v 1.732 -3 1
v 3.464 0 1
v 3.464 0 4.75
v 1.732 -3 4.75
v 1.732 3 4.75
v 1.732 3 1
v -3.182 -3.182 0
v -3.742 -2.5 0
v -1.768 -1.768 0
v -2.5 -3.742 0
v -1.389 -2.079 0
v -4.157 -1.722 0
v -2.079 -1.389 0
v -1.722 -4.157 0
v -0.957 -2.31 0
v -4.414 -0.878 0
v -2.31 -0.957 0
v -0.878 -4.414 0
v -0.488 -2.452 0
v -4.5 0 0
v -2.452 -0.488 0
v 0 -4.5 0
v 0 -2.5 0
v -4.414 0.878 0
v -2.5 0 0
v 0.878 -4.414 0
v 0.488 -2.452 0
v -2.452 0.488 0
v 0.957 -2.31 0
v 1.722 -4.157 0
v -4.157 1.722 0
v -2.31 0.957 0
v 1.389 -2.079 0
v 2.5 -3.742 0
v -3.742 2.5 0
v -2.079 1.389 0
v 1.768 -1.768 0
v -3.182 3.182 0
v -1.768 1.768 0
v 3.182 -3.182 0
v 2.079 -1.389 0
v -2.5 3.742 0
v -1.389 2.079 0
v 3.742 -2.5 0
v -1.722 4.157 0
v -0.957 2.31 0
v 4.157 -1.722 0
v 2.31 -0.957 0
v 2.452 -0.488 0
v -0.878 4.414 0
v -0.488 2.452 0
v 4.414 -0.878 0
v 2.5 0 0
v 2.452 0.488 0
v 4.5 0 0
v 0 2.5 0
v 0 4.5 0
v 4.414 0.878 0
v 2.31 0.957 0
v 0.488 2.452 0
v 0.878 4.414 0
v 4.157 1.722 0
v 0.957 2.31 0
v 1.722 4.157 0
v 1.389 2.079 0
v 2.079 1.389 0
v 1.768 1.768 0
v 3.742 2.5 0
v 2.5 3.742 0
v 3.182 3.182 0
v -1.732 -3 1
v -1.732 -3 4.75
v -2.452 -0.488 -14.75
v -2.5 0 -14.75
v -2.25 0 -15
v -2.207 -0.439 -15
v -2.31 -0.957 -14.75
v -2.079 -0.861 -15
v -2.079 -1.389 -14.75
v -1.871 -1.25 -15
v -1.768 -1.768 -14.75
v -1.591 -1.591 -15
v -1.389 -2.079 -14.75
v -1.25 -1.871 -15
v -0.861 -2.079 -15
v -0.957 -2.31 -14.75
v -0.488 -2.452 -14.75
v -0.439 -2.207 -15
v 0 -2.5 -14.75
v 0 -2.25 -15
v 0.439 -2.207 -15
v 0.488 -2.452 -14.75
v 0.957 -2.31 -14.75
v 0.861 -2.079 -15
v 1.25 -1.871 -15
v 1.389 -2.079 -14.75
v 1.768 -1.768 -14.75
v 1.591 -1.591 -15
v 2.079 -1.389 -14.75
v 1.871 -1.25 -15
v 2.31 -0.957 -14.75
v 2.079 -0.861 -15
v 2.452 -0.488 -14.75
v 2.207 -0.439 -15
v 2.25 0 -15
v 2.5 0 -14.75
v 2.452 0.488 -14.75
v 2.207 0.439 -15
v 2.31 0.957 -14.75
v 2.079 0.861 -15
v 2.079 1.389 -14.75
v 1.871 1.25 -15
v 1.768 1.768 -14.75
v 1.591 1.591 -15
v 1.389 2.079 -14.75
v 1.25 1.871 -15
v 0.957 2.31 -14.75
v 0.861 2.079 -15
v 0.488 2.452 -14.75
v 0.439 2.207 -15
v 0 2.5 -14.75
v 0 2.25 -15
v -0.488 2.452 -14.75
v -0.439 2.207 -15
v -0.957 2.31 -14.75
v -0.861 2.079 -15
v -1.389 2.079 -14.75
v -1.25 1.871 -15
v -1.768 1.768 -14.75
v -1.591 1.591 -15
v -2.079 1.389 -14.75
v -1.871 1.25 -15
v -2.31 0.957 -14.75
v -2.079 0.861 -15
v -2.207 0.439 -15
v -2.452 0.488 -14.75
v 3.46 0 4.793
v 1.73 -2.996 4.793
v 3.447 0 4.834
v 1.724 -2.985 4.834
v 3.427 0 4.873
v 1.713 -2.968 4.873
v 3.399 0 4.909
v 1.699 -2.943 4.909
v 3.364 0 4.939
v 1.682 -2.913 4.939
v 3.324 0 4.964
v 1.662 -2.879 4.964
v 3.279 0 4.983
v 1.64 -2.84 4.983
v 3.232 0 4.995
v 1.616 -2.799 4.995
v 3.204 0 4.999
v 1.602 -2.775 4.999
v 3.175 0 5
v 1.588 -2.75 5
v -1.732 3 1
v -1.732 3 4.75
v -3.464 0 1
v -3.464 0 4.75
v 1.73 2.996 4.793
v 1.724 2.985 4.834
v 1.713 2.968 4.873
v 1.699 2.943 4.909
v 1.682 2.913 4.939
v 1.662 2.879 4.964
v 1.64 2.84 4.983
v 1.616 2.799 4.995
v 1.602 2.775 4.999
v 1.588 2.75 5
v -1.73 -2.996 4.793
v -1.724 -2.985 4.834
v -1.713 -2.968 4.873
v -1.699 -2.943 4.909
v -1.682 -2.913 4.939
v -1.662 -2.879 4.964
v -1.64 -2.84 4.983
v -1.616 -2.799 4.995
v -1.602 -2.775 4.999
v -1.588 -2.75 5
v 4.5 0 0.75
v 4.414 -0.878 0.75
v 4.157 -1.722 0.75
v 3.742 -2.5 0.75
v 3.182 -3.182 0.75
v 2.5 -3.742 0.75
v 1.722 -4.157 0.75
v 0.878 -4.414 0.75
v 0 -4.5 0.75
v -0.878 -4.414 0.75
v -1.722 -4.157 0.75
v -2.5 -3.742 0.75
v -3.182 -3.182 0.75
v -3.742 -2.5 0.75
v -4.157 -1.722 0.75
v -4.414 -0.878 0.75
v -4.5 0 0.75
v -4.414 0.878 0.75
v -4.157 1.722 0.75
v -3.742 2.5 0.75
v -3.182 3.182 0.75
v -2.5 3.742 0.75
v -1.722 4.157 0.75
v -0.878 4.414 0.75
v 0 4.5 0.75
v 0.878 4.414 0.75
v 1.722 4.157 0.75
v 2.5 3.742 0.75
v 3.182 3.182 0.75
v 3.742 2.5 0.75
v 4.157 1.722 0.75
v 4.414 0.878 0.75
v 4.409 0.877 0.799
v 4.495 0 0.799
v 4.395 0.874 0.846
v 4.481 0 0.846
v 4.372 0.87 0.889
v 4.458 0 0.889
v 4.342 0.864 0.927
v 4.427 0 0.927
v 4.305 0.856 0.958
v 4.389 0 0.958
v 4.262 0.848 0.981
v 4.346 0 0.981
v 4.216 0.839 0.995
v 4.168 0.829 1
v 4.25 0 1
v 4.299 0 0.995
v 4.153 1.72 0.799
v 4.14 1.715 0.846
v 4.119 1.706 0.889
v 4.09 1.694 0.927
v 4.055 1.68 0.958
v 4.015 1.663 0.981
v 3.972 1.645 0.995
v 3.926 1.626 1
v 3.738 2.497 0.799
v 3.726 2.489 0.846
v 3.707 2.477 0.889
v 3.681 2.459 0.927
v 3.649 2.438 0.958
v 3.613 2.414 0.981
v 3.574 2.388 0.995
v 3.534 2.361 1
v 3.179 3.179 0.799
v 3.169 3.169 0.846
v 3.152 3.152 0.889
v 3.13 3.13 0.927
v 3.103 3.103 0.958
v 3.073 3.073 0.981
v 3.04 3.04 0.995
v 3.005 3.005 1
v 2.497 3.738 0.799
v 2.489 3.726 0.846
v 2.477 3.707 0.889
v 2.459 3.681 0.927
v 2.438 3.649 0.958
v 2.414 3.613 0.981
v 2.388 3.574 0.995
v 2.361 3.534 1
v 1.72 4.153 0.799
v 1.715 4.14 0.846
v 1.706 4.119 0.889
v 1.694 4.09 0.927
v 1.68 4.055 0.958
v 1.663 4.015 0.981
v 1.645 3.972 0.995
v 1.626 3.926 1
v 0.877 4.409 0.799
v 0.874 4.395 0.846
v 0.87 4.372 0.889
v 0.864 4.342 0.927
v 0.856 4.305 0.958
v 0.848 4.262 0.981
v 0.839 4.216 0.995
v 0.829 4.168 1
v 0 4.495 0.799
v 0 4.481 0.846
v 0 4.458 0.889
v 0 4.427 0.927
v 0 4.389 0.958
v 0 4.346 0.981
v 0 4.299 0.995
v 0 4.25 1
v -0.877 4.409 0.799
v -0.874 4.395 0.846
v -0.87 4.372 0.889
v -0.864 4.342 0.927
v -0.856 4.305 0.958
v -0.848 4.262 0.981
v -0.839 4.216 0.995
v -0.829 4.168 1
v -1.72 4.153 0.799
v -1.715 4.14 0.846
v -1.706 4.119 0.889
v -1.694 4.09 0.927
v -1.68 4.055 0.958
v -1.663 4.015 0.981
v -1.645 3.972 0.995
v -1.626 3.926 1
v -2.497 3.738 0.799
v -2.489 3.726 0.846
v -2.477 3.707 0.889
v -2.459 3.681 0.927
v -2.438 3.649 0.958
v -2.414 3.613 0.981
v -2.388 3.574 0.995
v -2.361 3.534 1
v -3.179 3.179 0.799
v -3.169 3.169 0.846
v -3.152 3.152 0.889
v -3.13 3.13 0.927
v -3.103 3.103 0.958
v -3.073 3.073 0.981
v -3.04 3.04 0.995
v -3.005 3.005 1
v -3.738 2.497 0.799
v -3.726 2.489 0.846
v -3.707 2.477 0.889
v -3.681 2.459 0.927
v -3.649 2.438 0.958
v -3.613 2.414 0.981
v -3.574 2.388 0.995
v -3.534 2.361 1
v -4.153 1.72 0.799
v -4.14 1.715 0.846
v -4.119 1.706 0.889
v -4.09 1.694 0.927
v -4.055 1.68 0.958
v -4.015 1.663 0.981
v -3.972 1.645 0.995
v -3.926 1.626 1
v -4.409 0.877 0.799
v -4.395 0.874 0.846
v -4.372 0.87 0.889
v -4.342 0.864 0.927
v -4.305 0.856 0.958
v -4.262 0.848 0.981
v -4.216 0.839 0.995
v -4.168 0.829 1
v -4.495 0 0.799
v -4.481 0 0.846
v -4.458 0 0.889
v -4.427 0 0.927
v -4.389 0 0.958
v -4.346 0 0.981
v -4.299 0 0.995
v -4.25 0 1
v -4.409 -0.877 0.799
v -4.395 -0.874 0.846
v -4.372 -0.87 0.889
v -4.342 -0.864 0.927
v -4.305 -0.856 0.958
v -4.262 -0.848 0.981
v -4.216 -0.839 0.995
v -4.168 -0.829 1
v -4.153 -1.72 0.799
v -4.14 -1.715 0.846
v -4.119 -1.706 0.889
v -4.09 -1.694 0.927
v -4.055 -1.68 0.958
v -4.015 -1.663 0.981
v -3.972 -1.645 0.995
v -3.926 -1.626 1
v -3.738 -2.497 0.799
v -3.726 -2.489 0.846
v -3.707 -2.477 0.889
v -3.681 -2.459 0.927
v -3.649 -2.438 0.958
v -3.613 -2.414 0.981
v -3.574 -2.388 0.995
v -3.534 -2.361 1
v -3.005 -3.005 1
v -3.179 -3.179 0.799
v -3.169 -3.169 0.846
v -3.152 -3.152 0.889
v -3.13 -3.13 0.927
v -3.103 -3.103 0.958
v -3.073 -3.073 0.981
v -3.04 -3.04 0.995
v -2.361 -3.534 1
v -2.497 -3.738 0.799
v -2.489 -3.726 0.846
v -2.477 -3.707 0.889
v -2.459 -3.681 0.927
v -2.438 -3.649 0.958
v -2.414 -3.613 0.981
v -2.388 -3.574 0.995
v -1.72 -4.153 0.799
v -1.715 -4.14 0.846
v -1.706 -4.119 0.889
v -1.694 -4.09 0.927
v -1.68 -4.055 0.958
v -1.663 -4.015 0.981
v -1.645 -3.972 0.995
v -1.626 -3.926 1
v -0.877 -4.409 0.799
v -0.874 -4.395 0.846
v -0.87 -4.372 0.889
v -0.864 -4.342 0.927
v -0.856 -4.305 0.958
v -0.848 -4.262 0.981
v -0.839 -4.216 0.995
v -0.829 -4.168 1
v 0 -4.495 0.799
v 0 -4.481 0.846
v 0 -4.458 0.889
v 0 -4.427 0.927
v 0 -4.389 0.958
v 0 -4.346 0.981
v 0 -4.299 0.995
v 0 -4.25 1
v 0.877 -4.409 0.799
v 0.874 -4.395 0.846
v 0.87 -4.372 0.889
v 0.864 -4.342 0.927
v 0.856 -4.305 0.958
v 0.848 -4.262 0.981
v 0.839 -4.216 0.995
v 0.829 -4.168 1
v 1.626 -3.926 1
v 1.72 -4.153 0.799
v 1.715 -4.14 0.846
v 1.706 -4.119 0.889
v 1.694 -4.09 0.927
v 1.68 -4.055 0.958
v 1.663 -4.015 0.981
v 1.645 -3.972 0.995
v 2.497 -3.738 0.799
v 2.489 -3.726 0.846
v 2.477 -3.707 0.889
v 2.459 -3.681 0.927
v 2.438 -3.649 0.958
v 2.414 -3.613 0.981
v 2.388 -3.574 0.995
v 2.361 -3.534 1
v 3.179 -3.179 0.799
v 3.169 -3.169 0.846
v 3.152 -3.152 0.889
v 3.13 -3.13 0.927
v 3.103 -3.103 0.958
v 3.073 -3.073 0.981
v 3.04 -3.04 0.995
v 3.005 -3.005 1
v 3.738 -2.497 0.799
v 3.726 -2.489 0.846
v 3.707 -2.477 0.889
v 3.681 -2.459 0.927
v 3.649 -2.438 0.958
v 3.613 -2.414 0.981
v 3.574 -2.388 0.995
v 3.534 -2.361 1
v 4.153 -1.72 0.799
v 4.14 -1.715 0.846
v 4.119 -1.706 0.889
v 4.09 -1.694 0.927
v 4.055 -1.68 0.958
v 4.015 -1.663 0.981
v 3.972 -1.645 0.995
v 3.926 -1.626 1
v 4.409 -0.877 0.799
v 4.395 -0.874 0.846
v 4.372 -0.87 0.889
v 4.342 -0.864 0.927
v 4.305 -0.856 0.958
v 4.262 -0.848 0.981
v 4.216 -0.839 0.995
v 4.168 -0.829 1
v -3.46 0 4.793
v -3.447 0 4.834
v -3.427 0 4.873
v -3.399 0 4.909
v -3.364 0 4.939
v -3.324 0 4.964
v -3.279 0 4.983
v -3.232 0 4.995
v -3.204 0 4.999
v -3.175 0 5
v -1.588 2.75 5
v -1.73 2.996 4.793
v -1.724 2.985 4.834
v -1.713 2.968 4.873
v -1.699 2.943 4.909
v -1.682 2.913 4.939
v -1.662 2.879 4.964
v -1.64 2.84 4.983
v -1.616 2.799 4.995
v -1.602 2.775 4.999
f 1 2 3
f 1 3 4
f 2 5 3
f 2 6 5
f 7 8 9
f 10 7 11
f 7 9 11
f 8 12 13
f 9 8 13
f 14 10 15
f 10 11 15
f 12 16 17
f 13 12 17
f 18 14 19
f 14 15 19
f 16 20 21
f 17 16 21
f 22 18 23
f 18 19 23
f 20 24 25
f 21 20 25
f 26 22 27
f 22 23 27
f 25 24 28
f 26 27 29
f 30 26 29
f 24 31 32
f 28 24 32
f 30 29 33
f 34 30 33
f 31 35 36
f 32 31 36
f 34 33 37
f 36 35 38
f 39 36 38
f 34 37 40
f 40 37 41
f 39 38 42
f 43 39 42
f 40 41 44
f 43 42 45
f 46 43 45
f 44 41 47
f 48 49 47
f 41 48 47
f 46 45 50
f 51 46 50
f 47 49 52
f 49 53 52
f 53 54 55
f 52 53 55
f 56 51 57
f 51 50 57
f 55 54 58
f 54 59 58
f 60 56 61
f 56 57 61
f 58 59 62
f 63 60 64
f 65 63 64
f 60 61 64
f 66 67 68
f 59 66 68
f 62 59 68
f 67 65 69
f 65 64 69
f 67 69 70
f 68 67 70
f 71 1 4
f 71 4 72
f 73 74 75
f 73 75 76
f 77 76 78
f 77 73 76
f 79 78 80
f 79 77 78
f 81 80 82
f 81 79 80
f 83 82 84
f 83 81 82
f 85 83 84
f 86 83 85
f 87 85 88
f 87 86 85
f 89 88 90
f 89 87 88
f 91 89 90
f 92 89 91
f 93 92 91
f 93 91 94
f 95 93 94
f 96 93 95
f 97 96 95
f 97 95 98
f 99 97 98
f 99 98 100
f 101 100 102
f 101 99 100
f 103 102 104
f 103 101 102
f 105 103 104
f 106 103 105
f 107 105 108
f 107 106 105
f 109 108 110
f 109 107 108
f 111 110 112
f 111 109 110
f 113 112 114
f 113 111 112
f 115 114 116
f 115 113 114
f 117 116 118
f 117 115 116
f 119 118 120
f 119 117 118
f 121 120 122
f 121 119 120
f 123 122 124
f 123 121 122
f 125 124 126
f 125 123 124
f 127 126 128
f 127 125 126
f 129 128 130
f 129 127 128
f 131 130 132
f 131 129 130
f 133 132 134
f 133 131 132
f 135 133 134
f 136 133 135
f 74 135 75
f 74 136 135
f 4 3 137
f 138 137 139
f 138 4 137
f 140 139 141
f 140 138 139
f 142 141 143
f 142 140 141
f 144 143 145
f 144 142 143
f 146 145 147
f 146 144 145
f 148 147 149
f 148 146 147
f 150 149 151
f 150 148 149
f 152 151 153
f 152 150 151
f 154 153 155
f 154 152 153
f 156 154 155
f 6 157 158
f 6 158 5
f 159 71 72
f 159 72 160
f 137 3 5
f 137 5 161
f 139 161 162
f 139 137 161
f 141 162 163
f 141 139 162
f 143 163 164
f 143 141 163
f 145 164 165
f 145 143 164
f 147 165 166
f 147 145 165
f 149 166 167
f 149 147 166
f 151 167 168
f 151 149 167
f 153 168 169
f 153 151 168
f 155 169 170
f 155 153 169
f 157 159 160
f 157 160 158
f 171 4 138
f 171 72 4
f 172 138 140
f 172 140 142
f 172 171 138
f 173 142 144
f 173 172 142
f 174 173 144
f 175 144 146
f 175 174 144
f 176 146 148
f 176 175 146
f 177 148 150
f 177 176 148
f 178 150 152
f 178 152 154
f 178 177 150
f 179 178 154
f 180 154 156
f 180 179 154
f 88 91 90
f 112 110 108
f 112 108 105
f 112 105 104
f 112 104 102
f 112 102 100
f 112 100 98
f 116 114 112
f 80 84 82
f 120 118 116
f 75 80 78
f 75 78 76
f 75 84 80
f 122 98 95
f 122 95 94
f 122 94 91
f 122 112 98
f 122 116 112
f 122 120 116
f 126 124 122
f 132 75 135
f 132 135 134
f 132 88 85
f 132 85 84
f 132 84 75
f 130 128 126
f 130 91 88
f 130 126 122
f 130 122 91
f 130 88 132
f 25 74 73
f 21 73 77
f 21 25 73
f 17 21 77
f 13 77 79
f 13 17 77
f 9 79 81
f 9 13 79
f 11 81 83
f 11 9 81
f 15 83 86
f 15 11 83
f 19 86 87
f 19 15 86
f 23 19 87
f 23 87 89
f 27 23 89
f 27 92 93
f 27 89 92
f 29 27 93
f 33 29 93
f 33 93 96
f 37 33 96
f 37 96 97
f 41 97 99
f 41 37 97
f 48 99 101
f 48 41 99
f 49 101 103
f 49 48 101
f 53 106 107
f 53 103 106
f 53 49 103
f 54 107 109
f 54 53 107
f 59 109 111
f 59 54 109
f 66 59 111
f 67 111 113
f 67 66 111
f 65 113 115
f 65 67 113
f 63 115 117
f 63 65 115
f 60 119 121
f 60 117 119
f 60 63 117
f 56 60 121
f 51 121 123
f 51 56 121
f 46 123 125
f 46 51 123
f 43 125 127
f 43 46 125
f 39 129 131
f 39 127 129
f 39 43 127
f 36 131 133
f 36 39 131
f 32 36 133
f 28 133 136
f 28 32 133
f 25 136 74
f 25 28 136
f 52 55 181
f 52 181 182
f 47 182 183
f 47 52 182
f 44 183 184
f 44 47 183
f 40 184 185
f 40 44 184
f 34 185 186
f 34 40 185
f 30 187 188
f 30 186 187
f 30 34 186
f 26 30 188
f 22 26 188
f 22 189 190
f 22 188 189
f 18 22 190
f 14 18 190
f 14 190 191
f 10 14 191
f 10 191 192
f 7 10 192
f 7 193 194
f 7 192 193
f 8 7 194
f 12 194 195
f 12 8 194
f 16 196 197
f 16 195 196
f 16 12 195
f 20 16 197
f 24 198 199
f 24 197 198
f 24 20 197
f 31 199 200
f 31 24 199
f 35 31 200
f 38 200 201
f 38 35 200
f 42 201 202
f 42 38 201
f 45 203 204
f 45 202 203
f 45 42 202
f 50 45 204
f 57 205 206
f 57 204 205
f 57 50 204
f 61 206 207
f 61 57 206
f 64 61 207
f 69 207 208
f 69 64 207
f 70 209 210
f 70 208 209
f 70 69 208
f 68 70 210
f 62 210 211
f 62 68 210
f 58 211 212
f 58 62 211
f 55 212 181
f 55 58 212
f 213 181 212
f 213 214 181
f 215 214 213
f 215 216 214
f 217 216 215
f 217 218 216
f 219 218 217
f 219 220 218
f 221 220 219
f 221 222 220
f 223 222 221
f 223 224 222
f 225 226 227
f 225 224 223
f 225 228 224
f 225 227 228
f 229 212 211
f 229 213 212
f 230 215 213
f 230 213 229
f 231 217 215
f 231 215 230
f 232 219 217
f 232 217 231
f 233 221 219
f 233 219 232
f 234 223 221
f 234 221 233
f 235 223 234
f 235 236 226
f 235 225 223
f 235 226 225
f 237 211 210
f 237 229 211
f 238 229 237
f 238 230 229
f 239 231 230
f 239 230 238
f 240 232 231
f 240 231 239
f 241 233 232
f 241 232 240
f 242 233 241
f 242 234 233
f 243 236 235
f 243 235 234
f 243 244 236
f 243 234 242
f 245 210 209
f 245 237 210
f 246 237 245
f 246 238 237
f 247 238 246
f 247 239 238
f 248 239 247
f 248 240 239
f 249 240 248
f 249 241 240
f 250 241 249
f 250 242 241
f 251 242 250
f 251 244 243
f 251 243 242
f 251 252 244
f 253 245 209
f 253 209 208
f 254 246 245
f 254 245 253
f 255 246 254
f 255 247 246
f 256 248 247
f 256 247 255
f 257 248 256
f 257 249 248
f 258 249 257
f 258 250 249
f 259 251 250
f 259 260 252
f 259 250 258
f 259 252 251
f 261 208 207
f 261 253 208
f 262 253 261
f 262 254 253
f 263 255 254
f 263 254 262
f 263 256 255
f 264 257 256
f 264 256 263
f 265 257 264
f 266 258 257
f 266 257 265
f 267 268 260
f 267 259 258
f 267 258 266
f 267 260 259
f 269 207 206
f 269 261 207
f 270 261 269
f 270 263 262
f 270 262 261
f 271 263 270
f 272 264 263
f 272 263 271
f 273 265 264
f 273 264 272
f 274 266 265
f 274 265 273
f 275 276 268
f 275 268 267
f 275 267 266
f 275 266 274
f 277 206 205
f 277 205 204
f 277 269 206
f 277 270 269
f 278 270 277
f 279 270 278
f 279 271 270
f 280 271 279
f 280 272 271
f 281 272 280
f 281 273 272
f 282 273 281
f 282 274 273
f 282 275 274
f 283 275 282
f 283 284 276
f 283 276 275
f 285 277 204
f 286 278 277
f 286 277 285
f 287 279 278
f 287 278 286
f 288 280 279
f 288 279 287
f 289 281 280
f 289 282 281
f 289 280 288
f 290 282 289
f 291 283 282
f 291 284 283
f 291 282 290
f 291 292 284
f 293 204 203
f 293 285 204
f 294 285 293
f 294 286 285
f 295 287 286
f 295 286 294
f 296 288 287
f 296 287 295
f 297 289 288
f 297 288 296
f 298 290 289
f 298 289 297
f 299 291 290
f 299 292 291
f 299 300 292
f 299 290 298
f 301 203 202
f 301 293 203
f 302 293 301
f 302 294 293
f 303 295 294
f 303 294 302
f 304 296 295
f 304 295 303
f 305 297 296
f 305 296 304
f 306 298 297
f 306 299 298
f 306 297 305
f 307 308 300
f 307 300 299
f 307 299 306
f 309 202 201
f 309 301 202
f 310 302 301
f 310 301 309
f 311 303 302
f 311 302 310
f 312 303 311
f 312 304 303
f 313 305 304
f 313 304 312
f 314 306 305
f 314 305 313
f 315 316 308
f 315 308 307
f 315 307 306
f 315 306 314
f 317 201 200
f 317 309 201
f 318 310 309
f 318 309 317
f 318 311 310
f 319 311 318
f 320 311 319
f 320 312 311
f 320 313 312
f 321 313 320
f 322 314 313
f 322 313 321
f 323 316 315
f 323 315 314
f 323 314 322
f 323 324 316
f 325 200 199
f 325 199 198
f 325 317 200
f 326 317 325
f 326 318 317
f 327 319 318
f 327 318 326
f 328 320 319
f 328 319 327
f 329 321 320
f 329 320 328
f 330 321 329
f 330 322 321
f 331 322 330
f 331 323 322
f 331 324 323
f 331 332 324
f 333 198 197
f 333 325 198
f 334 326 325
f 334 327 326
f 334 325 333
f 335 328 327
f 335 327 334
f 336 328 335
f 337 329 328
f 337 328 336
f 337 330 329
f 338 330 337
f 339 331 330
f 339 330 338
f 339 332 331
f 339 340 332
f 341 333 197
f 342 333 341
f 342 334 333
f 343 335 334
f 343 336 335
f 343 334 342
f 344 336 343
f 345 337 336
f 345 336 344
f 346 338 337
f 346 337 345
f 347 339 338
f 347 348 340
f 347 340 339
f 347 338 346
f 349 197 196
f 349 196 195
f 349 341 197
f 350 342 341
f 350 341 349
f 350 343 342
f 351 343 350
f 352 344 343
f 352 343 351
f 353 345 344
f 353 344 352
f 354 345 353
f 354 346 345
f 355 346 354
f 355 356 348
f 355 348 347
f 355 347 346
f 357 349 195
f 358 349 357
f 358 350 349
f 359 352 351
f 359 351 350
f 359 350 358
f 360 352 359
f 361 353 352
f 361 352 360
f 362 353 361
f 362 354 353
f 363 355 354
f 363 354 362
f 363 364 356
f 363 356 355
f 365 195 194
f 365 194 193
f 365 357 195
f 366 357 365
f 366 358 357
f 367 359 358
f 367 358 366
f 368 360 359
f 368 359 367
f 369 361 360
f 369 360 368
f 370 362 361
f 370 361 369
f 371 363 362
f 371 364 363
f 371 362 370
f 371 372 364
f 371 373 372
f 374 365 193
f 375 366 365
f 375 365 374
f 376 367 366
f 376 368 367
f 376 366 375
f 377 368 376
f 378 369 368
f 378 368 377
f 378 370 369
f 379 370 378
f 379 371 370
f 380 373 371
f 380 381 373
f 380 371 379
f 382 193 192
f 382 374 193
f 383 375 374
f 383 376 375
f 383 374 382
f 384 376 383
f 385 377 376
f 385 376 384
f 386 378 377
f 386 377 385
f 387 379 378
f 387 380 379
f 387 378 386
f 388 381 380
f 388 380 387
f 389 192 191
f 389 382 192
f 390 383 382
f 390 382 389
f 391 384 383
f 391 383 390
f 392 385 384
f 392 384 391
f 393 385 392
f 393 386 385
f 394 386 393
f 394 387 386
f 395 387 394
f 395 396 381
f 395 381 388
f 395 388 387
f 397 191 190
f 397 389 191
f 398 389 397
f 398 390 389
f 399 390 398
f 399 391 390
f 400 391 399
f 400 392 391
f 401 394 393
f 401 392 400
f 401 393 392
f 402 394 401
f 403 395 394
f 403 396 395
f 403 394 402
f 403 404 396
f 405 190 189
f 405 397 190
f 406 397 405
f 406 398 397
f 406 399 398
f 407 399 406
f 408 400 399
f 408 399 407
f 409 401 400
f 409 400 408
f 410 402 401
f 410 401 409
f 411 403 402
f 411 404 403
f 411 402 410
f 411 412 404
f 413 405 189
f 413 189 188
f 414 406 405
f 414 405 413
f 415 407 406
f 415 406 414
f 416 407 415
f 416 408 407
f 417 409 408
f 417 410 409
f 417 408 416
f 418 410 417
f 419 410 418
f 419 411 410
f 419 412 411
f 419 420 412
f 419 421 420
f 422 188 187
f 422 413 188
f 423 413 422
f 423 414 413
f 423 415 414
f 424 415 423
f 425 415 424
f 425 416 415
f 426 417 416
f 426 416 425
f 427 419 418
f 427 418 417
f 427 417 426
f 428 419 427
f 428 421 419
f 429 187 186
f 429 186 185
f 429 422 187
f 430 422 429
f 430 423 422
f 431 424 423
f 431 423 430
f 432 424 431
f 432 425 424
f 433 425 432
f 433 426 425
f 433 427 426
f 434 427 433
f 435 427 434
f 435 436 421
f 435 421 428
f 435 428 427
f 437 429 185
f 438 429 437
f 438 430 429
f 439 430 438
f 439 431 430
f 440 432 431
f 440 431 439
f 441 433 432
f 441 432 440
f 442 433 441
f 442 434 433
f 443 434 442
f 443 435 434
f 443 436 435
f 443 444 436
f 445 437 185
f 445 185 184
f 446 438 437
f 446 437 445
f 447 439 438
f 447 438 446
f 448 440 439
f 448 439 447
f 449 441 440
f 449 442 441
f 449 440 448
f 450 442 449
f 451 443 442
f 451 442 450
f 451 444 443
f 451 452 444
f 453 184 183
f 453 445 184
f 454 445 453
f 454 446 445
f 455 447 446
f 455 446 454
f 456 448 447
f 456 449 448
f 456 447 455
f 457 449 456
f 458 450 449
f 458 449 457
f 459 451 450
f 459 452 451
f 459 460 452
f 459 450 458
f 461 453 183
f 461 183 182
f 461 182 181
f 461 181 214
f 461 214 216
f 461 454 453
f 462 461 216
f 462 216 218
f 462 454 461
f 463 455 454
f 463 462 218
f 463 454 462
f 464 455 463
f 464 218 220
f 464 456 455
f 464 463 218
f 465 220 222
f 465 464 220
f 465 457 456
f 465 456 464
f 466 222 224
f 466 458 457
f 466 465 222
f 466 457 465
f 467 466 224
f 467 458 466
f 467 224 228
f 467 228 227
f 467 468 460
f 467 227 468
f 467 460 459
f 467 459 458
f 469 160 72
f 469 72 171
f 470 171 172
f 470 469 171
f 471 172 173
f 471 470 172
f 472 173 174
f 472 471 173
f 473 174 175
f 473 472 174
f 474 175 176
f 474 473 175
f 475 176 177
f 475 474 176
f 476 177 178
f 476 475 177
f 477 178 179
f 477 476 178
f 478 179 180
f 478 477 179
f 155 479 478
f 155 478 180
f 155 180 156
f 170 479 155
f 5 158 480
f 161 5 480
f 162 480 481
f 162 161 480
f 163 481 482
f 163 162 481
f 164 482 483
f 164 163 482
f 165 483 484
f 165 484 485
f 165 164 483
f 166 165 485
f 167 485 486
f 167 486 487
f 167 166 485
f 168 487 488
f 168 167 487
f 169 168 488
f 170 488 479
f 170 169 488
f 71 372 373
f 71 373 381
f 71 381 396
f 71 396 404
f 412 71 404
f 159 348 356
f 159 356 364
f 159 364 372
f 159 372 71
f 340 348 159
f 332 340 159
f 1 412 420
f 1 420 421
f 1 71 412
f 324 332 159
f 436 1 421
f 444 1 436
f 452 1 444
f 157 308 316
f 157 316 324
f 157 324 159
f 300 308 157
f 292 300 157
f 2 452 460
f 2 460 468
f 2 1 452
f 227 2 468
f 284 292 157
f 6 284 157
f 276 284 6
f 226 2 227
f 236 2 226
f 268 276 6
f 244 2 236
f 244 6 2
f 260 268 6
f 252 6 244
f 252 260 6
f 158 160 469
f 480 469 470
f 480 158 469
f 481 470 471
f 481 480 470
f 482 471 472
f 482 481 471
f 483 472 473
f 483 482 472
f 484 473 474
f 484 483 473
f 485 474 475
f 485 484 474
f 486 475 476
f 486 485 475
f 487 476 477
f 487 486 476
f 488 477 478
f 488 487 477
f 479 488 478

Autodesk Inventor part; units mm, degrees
ref_plane "YZ Plane" through (0, 0, 0) normal (1, 0, 0) x (0, 1, 0)
ref_plane "XZ Plane" through (0, 0, 0) normal (0, 1, 0) x (-1, 0, 0)
ref_plane "XY Plane" through (0, 0, 0) normal (0, 0, 1) x (1, 0, 0)
sketch "草图1" plane through (0, 0, 0) normal (0, 0, 1) x (1, 0, 0)
  circle A0 centre (0, 0) radius 4.5
  dimension "d0" = 9
extrude "拉伸1" add sketch "草图1" along normal blind 1
sketch "草图2" plane through (0, 0, 1) normal (0, 0, 1) x (1, 0, 0)
  line L0 (1.7321, -3) -> (-1.7321, -3)
  line L1 (-1.7321, -3) -> (-3.4641, 0)
  line L2 (-3.4641, 0) -> (-1.7321, 3)
  line L3 (-1.7321, 3) -> (1.7321, 3)
  line L4 (1.7321, 3) -> (3.4641, 0)
  line L5 (3.4641, 0) -> (1.7321, -3)
  line L6 (0, 0) -> (0, 0.7282)
  point P0 (0, 3)
  dimension "d3" = 0.7282
  dimension "d4" = 6
extrude "拉伸2" add sketch "草图2" along normal blind 4
sketch "草图3" plane through (0, 0, 0) normal (0, 0, -1) x (-1, 0, 0)
  circle A0 centre (0, 0) radius 2.5
  dimension "d7" = 5
extrude "拉伸3" add sketch "草图3" along normal blind 15
thread "螺纹1" size "M5x0.8" class "6g" standard "ANSI Metric M Profile" full length
chamfer "倒角1" distance 0.25 angle 45 1 edges at (2.5, 0, -15)
fillet "圆角1" radius 0.25 1 edges at (-4.5, 0, 1)
fillet "圆角2" radius 0.25 6 edges at (0, -3, 5) (2.5981, -1.5, 5) (2.5981, 1.5, 5) (0, 3, 5) (-2.5981, 1.5, 5) (-2.5981, -1.5, 5)
properties part number "砂轮架带动曲柄轴盖螺丝"
